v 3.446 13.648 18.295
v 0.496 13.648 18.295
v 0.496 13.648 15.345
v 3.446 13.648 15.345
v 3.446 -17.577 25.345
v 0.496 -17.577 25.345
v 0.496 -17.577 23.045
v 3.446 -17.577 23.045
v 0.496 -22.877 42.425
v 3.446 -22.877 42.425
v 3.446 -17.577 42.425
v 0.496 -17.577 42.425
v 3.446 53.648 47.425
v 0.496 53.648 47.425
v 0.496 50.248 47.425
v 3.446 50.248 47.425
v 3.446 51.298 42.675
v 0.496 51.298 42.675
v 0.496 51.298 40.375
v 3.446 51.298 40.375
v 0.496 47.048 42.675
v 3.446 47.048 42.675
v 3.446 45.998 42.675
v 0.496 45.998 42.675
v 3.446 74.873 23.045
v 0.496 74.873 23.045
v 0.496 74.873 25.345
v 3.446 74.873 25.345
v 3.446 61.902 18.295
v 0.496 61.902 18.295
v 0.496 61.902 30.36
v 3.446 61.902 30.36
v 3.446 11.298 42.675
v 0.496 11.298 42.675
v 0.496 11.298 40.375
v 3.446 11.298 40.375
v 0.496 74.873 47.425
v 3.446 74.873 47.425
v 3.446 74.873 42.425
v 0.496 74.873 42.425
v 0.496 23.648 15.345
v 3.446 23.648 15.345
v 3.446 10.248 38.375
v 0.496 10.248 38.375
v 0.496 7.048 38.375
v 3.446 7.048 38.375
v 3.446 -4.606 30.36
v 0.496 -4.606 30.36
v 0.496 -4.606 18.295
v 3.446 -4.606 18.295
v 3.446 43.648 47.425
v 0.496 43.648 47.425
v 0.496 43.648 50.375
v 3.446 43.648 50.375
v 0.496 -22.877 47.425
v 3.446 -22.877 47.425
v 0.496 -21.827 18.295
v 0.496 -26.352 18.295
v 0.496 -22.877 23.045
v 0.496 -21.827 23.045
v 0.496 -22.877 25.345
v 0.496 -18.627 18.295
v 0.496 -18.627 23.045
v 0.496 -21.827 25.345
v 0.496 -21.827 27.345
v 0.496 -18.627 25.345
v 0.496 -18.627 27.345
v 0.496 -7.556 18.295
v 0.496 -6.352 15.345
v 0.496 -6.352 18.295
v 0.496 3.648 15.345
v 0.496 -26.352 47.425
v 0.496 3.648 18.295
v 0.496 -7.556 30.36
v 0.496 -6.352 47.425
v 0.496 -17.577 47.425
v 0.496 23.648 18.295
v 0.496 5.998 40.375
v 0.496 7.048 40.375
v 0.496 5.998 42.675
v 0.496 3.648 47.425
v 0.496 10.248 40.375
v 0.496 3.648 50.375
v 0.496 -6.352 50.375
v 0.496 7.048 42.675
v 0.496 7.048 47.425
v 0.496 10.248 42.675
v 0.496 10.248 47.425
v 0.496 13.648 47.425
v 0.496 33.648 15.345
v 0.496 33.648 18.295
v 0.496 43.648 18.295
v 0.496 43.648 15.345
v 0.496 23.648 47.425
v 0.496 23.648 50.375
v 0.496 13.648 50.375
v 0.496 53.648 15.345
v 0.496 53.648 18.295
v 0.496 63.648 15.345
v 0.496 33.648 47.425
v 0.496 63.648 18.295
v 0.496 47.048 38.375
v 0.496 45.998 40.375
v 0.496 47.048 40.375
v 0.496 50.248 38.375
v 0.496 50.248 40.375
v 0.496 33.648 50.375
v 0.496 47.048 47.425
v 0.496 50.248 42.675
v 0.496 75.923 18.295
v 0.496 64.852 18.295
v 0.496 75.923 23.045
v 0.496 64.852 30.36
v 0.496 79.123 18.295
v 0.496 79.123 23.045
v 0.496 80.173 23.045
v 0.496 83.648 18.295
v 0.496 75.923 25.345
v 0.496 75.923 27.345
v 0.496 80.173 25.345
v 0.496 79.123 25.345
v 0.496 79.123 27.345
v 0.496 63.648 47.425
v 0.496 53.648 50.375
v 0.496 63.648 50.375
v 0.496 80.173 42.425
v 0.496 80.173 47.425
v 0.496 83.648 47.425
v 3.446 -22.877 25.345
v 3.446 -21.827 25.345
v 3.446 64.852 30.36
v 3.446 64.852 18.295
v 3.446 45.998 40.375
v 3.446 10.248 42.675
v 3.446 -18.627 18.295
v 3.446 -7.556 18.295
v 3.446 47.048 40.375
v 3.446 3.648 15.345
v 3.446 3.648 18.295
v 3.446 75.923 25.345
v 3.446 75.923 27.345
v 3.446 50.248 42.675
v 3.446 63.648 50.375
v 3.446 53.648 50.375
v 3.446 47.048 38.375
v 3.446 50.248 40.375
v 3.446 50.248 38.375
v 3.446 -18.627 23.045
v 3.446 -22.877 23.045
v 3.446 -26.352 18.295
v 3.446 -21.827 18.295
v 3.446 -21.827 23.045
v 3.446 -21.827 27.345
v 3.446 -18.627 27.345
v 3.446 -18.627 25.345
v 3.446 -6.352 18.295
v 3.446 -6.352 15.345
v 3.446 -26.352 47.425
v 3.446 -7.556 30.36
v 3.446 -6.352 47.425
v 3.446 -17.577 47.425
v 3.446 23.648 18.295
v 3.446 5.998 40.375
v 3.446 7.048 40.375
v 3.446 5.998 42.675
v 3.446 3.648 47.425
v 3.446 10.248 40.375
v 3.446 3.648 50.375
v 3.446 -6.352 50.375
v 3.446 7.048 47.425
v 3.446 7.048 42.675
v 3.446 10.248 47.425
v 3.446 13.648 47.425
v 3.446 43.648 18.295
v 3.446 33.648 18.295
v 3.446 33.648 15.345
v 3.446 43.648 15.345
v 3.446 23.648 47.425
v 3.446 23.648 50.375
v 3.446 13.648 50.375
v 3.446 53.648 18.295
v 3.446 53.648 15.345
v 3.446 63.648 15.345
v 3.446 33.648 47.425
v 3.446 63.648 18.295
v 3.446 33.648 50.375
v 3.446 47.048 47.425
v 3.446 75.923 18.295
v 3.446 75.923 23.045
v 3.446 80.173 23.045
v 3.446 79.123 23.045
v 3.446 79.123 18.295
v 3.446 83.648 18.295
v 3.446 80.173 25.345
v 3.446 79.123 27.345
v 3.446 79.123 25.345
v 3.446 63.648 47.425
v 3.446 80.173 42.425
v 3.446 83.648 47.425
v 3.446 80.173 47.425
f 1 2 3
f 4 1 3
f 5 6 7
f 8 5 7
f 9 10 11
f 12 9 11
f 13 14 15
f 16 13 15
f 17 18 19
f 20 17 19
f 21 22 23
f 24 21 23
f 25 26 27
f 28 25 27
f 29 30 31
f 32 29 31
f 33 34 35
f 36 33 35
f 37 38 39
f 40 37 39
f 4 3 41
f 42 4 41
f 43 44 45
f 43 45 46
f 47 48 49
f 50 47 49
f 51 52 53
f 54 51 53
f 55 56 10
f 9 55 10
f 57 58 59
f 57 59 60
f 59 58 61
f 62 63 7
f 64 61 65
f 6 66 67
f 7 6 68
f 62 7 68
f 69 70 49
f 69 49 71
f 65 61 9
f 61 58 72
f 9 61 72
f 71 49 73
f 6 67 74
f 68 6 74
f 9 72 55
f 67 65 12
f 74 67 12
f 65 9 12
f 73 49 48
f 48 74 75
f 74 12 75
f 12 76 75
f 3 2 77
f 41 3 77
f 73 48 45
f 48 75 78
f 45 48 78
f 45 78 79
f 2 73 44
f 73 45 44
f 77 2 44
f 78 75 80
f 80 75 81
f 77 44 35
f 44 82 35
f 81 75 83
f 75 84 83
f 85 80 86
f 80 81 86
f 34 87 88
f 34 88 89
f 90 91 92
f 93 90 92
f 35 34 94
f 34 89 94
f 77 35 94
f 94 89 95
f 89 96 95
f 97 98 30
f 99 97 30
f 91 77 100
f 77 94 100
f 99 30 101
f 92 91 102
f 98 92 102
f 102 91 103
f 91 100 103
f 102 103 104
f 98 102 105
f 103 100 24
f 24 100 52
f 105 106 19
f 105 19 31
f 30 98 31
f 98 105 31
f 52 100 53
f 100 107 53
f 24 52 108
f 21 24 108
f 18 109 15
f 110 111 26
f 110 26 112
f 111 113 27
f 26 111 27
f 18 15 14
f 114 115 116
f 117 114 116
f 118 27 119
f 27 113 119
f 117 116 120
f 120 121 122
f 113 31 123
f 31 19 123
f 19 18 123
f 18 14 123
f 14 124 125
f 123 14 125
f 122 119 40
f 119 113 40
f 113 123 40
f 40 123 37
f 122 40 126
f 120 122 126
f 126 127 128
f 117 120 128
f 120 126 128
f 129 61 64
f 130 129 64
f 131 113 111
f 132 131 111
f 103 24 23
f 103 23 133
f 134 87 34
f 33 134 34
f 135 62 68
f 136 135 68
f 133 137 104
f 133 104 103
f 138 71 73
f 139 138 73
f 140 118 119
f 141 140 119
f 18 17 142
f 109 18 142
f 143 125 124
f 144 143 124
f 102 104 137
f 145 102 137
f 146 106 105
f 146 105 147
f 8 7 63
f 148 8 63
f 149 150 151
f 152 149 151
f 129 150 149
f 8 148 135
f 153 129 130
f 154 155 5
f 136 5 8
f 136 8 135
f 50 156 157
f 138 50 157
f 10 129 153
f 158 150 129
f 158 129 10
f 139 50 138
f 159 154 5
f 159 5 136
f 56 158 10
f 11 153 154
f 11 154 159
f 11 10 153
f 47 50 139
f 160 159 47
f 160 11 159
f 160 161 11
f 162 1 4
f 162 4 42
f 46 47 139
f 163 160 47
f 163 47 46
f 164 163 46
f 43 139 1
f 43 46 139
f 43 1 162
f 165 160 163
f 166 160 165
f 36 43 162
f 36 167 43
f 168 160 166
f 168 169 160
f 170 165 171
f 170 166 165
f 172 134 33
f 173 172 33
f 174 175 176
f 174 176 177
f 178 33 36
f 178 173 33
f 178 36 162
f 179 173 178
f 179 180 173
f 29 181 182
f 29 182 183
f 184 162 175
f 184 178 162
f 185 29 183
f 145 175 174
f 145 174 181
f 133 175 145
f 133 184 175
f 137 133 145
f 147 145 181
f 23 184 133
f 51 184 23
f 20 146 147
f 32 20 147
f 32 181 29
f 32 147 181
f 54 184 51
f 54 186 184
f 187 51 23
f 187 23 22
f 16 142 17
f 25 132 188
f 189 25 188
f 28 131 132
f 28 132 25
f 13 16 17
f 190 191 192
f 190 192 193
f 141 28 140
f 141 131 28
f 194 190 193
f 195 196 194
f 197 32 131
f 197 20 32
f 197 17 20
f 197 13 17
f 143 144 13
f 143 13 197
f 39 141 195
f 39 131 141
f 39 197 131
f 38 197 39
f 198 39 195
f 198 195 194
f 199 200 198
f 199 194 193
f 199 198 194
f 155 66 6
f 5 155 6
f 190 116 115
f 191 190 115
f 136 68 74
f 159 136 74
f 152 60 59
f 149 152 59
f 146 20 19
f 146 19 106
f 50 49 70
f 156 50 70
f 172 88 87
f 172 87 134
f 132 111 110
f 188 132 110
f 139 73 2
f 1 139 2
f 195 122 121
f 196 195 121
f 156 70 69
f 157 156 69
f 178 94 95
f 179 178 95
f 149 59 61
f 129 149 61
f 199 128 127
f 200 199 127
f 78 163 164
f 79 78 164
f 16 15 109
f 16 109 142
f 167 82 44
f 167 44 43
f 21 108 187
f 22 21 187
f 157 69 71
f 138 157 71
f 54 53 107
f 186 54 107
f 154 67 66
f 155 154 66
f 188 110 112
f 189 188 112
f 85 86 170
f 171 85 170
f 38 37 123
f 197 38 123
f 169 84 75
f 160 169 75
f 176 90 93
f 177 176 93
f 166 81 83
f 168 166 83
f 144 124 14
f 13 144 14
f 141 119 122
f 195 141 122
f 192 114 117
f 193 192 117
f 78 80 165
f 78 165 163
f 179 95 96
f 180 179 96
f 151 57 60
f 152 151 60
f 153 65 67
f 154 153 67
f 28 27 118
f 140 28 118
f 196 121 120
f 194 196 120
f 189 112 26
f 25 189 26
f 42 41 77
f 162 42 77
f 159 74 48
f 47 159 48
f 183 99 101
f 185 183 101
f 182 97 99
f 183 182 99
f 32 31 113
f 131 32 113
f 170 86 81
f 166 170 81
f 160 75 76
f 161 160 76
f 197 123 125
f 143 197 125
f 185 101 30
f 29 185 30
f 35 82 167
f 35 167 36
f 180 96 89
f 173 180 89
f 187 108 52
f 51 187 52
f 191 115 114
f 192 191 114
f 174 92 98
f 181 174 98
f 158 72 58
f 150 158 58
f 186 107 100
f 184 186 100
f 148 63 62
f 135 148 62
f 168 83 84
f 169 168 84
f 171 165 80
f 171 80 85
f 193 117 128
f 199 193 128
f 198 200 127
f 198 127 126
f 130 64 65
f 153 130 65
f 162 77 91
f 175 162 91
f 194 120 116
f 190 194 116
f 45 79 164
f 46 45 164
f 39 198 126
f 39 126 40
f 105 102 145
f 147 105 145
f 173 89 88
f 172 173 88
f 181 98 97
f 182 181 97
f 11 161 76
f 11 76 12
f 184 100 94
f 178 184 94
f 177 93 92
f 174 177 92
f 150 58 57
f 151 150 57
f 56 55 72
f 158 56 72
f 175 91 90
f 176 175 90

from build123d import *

# Parameters (mm, degrees)
FRONT_START        = 0.495634701
FRONT_PLATE_DEPTH  = 2.95
SKETCH1_W          = 5
SKETCH1_H          = 5.3
CUT_EXTRUDE2_DEPTH = 98.689964927
CUT_EXTRUDE3_START = 2.95
SKETCH3_W          = 3.2
SKETCH3_H          = 3.2
CUT_EXTRUDE3_DEPTH = 12
SKETCH4_W          = 2.3
SKETCH4_H          = 5.3
CUT_EXTRUDE4_DEPTH = 98.689964927


# Read off the part's stored shape, not the designer's step: Front Plate
with BuildPart() as part:
    # Front Plate outline → Front Plate (new body)
    with BuildSketch(Plane.YZ.offset(FRONT_START)):
        Polygon((-18.627257495, 18.295409887), (-7.556257495, 18.295409887), (-7.556257495, 30.360409887), (-4.606257495, 30.360409887), (-4.606257495, 18.295409887), (-6.352257495, 18.295409887), (-6.352257495, 15.345409887), (3.647742505, 15.345409887), (3.647742505, 18.295409887), (13.647742505, 18.295409887), (13.647742505, 15.345409887), (23.647742505, 15.345409887), (23.647742505, 18.295409887), (33.647742505, 18.295409887), (33.647742505, 15.345409887), (43.647742505, 15.345409887), (43.647742505, 18.295409887), (53.647742505, 18.295409887), (53.647742505, 15.345409887), (63.647742505, 15.345409887), (63.647742505, 18.295409887), (61.901742505, 18.295409887), (61.901742505, 30.360409887), (64.851742505, 30.360409887), (64.851742505, 18.295409887), (75.922742505, 18.295409887), (75.922742505, 23.045409887), (74.872742505, 23.045409887), (74.872742505, 25.345409887), (75.922742505, 25.345409887), (75.922742505, 27.345409887), (79.122742505, 27.345409887), (79.122742505, 25.345409887), (80.172742505, 25.345409887), (80.172742505, 23.045409887), (79.122742505, 23.045409887), (79.122742505, 18.295409887), (83.647742505, 18.295409887), (83.647742505, 47.425409887), (63.647742505, 47.425409887), (63.647742505, 50.375409887), (53.647742505, 50.375409887), (53.647742505, 47.425409887), (43.647742505, 47.425409887), (43.647742505, 50.375409887), (33.647742505, 50.375409887), (33.647742505, 47.425409887), (23.647742505, 47.425409887), (23.647742505, 50.375409887), (13.647742505, 50.375409887), (13.647742505, 47.425409887), (3.647742505, 47.425409887), (3.647742505, 50.375409887), (-6.352257495, 50.375409887), (-6.352257495, 47.425409887), (-26.352257495, 47.425409887), (-26.352257495, 18.295409887), (-21.827257495, 18.295409887), (-21.827257495, 23.045409887), (-22.877257495, 23.045409887), (-22.877257495, 25.345409887), (-21.827257495, 25.345409887), (-21.827257495, 27.345409887), (-18.627257495, 27.345409887), (-18.627257495, 25.345409887), (-17.577257495, 25.345409887), (-17.577257495, 23.045409887), (-18.627257495, 23.045409887), align=None)
    extrude(amount=FRONT_PLATE_DEPTH)

    # Sketch1 → Cut-Extrude2 (cut, through all)
    with BuildSketch(Plane(origin=(3.445634701, 0, 0), x_dir=(0, 0, -1), z_dir=(1, 0, 0))):
        with Locations((-44.925409887, -20.227257495)):
            Rectangle(SKETCH1_W, SKETCH1_H)
    cut_extrude2 = extrude(amount=-CUT_EXTRUDE2_DEPTH, mode=Mode.SUBTRACT)

    # Sketch3 → Cut-Extrude3 (cut)
    with BuildSketch(Plane.XY.offset(47.425409887).offset(CUT_EXTRUDE3_START)):
        with Locations((1.970634701, 8.647742505)):
            Rectangle(SKETCH3_W, SKETCH3_H)
    cut_extrude3 = extrude(amount=-CUT_EXTRUDE3_DEPTH, mode=Mode.SUBTRACT)

    # Sketch4 → Cut-Extrude4 (cut, through all)
    with BuildSketch(Plane(origin=(3.445634701, 0, 0), x_dir=(0, 0, -1), z_dir=(1, 0, 0))):
        with Locations((-41.525409887, 8.647742505)):
            Rectangle(SKETCH4_W, SKETCH4_H)
    cut_extrude4 = extrude(amount=-CUT_EXTRUDE4_DEPTH, mode=Mode.SUBTRACT)

    # Mirror1: Cut-Extrude2, Cut-Extrude3, Cut-Extrude4 across plane
    add(cut_extrude2.mirror(Plane.ZX.offset(28.647742505)), mode=Mode.SUBTRACT)
    add(cut_extrude3.mirror(Plane.ZX.offset(28.647742505)), mode=Mode.SUBTRACT)
    add(cut_extrude4.mirror(Plane.ZX.offset(28.647742505)), mode=Mode.SUBTRACT)


solid = part.part
